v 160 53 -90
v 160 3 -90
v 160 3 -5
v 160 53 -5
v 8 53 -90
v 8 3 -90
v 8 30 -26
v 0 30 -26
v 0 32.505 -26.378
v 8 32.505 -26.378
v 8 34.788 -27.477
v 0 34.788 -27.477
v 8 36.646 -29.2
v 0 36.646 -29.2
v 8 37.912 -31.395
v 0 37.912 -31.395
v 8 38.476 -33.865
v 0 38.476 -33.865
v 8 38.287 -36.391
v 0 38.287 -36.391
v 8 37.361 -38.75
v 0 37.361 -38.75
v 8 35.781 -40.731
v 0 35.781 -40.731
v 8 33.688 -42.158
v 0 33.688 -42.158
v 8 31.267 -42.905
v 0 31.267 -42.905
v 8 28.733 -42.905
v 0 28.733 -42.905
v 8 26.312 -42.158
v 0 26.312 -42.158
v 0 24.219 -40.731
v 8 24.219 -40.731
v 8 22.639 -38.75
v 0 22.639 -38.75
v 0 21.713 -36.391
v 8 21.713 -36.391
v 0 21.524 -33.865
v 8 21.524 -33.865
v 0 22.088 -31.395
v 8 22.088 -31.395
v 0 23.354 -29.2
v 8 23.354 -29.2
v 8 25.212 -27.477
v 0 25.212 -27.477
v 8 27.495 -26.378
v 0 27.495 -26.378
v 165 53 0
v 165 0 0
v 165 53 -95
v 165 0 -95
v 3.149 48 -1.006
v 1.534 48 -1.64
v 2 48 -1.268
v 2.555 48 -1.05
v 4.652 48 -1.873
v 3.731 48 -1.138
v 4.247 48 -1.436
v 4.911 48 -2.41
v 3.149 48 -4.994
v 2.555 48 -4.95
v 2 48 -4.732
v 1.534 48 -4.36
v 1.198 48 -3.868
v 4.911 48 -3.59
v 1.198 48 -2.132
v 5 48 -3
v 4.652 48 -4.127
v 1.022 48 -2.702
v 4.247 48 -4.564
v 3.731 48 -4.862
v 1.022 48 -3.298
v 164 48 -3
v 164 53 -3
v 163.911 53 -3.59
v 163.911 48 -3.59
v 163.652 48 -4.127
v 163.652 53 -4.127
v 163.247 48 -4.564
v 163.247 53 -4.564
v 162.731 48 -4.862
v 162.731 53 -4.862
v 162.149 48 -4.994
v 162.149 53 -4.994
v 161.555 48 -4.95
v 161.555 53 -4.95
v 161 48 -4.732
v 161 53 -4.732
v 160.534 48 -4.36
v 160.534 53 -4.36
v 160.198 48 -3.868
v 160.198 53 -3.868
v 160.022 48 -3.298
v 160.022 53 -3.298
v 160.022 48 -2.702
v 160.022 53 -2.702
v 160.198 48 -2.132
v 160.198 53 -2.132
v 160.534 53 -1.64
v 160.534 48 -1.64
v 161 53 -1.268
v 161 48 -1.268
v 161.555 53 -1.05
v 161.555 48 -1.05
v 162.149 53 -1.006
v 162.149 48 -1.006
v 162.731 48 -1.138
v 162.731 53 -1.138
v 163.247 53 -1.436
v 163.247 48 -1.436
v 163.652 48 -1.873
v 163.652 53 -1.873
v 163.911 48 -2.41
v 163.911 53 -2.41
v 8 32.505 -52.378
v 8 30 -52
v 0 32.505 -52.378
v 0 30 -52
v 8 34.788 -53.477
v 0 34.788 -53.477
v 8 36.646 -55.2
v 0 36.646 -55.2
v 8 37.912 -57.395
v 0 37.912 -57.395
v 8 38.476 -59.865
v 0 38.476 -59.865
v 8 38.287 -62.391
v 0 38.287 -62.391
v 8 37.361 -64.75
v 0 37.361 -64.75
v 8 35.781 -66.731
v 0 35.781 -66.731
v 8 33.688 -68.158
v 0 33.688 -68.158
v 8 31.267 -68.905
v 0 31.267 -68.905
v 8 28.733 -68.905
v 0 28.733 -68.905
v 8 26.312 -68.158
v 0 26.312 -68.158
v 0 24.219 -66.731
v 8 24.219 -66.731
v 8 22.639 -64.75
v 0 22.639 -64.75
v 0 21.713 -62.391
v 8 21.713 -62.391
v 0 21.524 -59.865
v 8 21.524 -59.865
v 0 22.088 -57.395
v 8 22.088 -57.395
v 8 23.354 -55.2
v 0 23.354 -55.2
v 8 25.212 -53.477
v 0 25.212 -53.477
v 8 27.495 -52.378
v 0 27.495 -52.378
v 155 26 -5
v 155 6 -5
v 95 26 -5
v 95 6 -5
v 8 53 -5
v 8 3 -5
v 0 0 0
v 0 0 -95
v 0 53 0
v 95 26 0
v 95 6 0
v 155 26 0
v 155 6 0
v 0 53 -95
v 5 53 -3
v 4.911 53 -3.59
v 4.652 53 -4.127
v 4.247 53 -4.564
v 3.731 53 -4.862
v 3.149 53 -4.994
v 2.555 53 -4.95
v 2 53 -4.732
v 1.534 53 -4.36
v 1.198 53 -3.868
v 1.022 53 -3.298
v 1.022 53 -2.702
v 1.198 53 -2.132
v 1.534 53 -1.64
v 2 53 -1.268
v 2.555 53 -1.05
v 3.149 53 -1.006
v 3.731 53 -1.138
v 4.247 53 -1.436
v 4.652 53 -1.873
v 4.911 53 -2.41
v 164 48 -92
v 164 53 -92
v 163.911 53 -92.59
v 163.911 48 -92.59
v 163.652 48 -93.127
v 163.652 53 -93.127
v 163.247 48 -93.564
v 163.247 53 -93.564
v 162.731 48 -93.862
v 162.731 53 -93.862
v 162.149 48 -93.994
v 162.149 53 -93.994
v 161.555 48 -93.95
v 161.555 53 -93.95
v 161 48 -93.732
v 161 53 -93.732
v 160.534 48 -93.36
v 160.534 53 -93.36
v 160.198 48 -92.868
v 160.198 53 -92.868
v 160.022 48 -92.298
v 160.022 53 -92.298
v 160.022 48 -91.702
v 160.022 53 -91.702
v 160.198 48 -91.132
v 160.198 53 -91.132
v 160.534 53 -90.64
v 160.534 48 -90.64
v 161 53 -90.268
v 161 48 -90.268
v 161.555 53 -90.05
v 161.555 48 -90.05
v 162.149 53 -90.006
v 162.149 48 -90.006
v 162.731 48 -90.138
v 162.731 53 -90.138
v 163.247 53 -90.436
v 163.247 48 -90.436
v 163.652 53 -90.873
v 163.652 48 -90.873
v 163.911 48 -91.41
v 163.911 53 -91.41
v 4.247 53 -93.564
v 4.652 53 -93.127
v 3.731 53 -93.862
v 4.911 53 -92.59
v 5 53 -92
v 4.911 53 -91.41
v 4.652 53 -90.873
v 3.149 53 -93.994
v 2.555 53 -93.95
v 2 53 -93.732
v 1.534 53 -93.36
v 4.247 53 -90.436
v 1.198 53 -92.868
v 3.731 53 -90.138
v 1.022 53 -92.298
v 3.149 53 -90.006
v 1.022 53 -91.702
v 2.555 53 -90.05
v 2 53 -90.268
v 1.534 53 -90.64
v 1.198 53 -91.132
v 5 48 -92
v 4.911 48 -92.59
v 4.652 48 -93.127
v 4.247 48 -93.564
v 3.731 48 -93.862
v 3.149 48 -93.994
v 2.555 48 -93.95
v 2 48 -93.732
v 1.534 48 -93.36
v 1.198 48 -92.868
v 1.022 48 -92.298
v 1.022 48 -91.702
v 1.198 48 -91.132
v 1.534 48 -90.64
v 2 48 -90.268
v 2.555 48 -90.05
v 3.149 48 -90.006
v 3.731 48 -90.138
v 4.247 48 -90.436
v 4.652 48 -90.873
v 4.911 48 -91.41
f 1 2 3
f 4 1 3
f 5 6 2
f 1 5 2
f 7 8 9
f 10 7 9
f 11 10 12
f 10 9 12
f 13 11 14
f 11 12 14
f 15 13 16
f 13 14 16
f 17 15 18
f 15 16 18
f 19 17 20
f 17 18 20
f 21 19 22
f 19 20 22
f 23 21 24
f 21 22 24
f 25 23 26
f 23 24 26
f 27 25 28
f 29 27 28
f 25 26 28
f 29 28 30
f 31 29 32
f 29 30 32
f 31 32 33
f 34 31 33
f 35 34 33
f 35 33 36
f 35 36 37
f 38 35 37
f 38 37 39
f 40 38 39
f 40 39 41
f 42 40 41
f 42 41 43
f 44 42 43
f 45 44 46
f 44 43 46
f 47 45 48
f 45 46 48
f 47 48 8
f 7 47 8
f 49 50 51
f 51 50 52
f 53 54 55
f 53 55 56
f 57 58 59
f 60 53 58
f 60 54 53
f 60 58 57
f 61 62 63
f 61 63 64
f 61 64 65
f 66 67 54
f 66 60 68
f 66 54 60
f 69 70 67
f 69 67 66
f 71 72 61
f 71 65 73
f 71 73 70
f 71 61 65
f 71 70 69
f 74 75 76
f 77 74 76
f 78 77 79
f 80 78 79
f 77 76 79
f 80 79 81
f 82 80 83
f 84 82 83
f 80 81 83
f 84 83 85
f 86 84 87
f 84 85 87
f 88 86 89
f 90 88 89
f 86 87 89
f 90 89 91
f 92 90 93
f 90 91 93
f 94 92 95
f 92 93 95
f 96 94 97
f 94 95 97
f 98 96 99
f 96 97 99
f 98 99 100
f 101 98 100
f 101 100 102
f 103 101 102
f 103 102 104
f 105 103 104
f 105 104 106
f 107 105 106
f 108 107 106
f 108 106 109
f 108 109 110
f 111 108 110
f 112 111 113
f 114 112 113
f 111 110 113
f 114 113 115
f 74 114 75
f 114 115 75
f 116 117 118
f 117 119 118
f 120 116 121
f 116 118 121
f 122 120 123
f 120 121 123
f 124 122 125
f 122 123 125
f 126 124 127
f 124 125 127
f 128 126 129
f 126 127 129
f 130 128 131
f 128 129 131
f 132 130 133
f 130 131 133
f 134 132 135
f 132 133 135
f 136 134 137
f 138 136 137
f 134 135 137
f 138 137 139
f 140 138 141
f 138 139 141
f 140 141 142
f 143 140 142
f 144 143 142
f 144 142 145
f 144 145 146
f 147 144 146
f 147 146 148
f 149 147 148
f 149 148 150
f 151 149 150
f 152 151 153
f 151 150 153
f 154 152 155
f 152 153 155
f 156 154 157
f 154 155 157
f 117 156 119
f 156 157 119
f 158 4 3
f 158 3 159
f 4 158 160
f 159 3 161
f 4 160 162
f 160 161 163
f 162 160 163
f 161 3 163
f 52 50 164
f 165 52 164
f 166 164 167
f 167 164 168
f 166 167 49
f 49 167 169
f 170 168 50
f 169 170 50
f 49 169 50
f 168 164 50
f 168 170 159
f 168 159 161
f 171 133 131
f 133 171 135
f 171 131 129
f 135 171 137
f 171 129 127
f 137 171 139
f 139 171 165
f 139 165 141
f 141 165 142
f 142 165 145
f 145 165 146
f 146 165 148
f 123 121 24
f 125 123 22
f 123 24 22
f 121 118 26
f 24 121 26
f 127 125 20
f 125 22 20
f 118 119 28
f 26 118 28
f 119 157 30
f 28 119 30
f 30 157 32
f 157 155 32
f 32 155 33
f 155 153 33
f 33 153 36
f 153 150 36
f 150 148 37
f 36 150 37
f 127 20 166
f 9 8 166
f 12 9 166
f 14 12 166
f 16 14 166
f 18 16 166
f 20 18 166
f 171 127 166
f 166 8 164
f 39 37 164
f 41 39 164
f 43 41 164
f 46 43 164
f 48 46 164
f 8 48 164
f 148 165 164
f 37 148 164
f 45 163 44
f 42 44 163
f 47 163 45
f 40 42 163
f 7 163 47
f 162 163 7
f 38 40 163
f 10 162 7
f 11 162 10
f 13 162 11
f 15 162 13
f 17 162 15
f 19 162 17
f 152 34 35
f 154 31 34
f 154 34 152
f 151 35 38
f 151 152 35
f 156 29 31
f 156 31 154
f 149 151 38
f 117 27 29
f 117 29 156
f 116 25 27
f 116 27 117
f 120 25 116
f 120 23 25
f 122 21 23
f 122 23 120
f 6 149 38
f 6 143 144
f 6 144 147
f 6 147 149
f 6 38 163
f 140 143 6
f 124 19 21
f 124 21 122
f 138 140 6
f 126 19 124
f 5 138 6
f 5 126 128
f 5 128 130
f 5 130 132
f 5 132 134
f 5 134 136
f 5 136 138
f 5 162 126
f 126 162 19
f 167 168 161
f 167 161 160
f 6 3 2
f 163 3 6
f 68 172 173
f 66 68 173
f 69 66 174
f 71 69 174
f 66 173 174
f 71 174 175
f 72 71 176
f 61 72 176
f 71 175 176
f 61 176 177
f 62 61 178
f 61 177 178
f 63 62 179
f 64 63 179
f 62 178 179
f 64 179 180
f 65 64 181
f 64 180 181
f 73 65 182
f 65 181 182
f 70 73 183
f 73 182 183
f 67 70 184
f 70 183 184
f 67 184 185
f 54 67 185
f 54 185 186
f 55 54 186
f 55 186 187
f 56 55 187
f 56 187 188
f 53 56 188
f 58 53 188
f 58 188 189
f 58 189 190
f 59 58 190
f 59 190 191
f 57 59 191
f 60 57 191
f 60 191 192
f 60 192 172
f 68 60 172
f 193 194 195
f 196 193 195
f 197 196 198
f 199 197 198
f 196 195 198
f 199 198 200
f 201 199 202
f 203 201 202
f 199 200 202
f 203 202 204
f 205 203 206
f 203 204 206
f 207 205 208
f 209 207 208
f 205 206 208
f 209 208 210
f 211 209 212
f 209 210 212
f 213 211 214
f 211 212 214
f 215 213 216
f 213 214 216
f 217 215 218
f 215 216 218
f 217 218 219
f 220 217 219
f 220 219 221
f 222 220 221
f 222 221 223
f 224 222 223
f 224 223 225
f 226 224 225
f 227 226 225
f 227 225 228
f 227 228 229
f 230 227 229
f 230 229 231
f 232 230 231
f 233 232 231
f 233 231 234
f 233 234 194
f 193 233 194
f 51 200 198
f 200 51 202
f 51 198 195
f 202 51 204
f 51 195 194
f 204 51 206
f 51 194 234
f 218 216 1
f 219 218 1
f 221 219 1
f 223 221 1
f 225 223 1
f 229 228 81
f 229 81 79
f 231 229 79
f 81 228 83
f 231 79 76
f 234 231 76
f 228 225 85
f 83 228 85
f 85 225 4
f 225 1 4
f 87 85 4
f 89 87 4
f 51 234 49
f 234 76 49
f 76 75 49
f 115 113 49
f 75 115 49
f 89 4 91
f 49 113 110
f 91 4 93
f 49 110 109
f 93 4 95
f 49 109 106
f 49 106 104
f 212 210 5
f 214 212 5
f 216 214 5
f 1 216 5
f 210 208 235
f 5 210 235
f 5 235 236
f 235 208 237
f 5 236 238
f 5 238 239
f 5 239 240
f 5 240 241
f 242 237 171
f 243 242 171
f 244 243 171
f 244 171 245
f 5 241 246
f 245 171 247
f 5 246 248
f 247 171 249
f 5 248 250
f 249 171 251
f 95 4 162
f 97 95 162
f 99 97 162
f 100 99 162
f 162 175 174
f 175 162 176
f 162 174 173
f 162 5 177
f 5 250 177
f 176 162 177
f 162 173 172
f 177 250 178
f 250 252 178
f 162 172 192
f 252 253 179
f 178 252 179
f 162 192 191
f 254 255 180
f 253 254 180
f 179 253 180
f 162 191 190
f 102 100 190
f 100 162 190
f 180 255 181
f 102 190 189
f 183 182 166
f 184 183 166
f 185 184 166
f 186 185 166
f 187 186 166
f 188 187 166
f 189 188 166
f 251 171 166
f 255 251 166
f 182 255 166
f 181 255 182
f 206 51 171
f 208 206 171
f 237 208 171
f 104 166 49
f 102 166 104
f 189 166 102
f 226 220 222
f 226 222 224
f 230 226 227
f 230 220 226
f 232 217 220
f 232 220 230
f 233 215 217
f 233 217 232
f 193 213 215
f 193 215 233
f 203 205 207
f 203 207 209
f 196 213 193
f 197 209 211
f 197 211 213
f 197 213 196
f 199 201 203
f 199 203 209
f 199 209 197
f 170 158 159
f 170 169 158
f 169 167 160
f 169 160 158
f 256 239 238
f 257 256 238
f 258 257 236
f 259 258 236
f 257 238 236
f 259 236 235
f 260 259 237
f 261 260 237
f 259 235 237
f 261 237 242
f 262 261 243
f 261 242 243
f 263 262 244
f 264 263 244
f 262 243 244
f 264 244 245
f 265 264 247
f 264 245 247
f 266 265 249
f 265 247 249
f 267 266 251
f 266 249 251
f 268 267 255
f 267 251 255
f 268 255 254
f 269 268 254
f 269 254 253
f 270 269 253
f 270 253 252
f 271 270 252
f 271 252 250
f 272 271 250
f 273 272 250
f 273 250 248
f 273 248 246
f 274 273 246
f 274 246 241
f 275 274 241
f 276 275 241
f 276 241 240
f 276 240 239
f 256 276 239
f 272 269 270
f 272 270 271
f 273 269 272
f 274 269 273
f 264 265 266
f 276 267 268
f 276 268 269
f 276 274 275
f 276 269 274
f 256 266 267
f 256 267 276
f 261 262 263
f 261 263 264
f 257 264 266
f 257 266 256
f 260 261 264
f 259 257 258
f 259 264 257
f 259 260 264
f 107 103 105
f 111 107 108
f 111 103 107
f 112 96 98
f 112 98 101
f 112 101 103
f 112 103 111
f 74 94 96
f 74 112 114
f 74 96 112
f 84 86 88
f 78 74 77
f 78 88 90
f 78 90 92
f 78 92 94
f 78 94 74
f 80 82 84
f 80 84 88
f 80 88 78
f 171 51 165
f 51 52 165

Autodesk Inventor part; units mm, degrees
ref_plane "YZ Plane" through (0, 0, 0) normal (1, 0, 0) x (0, 1, 0)
ref_plane "XZ Plane" through (0, 0, 0) normal (0, 1, 0) x (-1, 0, 0)
ref_plane "XY Plane" through (0, 0, 0) normal (0, 0, 1) x (1, 0, 0)
sketch "草圖2" plane through (0, 0, 0) normal (0, 1, 0) x (-1, 0, 0)
  line L0 (0, 0) -> (-165, 0)
  line L1 (-165, 0) -> (-165, -95)
  line L2 (-165, -95) -> (0, -95)
  line L3 (0, -95) -> (0, 0)
  dimension "d1" = 95
  dimension "d2" = 165
extrude "擠出1" add sketch "草圖2" along normal blind 3
sketch "草圖3" plane through (0, 3, 0) normal (0, 1, 0) x (1, 0, 0)
  line L0 (5, 90) -> (160, 90)
  line L1 (160, 90) -> (160, 5)
  line L2 (160, 5) -> (5, 5)
  line L3 (5, 5) -> (5, 90)
  line L4 (165, 95) -> (0, 95) projected
  line L5 (165, 0) -> (165, 95) projected
  line L6 (0, 0) -> (165, 0) projected
  line L7 (0, 95) -> (0, 0) projected
  dimension "d5" = 5
  dimension "d6" = 5
  dimension "d7" = 5
  dimension "d8" = 5
extrude "擠出2" add sketch "草圖3" along normal blind 50
sketch "草圖4" plane through (0, 53, 0) normal (0, 1, 0) x (1, 0, 0)
  circle A0 centre (3, 92) radius 2
  line L0 (165, 95) -> (0, 95) projected
  line L1 (0, 95) -> (0, 0) projected
  circle A1 centre (3, 3) radius 2
  line L2 (0, 0) -> (165, 0) projected
  circle A2 centre (162, 3) radius 2
  line L3 (165, 0) -> (165, 95) projected
  circle A3 centre (162, 92) radius 2
  dimension "d11" = 4
  dimension "d12" = 3
  dimension "d13" = 3
  dimension "d14" = 4
  dimension "d15" = 3
  dimension "d16" = 3
  dimension "d17" = 4
  dimension "d18" = 3
  dimension "d19" = 3
  dimension "d20" = 4
  dimension "d21" = 3
  dimension "d22" = 3
extrude "擠出3" cut sketch "草圖4" against normal blind 5 contours A0 | A1 | A2 | A3
sketch "草圖7" plane through (5, 3, -5) normal (1, 0, 0) x (0, 0, -1)
  line L0 (85, 50) -> (0, 50)
  line L1 (0, 50) -> (0, 0)
  line L2 (0, 0) -> (85, 0)
  line L3 (85, 0) -> (85, 50)
  line L4 (0, 50) -> (85, 50) projected
  line L5 (85, 0) -> (85, 50) projected
  line L6 (85, 0) -> (0, 0) projected
  line L7 (0, 0) -> (0, 50) projected
  point P0 (-5, -3)
extrude "擠出4" add sketch "草圖7" along normal blind 3
sketch "草圖8" plane through (0, 0, -95) normal (-1, 0, 0) x (0, 0, 1)
  circle A0 centre (34.5, 30) radius 8.5
  circle A1 centre (60.5, 30) radius 8.5
  line L0 (0, 0) -> (95, 0) projected
  line L1 (0, 0) -> (0, 53) projected
  dimension "d27" = 17
  dimension "d28" = 17
  dimension "d29" = 26
  dimension "d30" = 30
  dimension "d31" = 30
  dimension "d32" = 34.5
extrude "擠出5" cut sketch "草圖8" against normal blind 60
sketch "草圖9" plane through (0, 0, 0) normal (0, 0, 1) x (1, 0, 0)
  line L0 (95, 26) -> (155, 26)
  line L1 (155, 26) -> (155, 6)
  line L2 (155, 6) -> (95, 6)
  line L3 (95, 6) -> (95, 26)
  line L4 (160, 3) -> (8, 3) projected
  line L5 (165, 0) -> (165, 53) projected
  point P0 (0, 0)
  dimension "d35" = 3
  dimension "d38" = 20
  dimension "d39" = 60
  dimension "d40" = 10
extrude "擠出6" cut sketch "草圖9" against normal blind 10
